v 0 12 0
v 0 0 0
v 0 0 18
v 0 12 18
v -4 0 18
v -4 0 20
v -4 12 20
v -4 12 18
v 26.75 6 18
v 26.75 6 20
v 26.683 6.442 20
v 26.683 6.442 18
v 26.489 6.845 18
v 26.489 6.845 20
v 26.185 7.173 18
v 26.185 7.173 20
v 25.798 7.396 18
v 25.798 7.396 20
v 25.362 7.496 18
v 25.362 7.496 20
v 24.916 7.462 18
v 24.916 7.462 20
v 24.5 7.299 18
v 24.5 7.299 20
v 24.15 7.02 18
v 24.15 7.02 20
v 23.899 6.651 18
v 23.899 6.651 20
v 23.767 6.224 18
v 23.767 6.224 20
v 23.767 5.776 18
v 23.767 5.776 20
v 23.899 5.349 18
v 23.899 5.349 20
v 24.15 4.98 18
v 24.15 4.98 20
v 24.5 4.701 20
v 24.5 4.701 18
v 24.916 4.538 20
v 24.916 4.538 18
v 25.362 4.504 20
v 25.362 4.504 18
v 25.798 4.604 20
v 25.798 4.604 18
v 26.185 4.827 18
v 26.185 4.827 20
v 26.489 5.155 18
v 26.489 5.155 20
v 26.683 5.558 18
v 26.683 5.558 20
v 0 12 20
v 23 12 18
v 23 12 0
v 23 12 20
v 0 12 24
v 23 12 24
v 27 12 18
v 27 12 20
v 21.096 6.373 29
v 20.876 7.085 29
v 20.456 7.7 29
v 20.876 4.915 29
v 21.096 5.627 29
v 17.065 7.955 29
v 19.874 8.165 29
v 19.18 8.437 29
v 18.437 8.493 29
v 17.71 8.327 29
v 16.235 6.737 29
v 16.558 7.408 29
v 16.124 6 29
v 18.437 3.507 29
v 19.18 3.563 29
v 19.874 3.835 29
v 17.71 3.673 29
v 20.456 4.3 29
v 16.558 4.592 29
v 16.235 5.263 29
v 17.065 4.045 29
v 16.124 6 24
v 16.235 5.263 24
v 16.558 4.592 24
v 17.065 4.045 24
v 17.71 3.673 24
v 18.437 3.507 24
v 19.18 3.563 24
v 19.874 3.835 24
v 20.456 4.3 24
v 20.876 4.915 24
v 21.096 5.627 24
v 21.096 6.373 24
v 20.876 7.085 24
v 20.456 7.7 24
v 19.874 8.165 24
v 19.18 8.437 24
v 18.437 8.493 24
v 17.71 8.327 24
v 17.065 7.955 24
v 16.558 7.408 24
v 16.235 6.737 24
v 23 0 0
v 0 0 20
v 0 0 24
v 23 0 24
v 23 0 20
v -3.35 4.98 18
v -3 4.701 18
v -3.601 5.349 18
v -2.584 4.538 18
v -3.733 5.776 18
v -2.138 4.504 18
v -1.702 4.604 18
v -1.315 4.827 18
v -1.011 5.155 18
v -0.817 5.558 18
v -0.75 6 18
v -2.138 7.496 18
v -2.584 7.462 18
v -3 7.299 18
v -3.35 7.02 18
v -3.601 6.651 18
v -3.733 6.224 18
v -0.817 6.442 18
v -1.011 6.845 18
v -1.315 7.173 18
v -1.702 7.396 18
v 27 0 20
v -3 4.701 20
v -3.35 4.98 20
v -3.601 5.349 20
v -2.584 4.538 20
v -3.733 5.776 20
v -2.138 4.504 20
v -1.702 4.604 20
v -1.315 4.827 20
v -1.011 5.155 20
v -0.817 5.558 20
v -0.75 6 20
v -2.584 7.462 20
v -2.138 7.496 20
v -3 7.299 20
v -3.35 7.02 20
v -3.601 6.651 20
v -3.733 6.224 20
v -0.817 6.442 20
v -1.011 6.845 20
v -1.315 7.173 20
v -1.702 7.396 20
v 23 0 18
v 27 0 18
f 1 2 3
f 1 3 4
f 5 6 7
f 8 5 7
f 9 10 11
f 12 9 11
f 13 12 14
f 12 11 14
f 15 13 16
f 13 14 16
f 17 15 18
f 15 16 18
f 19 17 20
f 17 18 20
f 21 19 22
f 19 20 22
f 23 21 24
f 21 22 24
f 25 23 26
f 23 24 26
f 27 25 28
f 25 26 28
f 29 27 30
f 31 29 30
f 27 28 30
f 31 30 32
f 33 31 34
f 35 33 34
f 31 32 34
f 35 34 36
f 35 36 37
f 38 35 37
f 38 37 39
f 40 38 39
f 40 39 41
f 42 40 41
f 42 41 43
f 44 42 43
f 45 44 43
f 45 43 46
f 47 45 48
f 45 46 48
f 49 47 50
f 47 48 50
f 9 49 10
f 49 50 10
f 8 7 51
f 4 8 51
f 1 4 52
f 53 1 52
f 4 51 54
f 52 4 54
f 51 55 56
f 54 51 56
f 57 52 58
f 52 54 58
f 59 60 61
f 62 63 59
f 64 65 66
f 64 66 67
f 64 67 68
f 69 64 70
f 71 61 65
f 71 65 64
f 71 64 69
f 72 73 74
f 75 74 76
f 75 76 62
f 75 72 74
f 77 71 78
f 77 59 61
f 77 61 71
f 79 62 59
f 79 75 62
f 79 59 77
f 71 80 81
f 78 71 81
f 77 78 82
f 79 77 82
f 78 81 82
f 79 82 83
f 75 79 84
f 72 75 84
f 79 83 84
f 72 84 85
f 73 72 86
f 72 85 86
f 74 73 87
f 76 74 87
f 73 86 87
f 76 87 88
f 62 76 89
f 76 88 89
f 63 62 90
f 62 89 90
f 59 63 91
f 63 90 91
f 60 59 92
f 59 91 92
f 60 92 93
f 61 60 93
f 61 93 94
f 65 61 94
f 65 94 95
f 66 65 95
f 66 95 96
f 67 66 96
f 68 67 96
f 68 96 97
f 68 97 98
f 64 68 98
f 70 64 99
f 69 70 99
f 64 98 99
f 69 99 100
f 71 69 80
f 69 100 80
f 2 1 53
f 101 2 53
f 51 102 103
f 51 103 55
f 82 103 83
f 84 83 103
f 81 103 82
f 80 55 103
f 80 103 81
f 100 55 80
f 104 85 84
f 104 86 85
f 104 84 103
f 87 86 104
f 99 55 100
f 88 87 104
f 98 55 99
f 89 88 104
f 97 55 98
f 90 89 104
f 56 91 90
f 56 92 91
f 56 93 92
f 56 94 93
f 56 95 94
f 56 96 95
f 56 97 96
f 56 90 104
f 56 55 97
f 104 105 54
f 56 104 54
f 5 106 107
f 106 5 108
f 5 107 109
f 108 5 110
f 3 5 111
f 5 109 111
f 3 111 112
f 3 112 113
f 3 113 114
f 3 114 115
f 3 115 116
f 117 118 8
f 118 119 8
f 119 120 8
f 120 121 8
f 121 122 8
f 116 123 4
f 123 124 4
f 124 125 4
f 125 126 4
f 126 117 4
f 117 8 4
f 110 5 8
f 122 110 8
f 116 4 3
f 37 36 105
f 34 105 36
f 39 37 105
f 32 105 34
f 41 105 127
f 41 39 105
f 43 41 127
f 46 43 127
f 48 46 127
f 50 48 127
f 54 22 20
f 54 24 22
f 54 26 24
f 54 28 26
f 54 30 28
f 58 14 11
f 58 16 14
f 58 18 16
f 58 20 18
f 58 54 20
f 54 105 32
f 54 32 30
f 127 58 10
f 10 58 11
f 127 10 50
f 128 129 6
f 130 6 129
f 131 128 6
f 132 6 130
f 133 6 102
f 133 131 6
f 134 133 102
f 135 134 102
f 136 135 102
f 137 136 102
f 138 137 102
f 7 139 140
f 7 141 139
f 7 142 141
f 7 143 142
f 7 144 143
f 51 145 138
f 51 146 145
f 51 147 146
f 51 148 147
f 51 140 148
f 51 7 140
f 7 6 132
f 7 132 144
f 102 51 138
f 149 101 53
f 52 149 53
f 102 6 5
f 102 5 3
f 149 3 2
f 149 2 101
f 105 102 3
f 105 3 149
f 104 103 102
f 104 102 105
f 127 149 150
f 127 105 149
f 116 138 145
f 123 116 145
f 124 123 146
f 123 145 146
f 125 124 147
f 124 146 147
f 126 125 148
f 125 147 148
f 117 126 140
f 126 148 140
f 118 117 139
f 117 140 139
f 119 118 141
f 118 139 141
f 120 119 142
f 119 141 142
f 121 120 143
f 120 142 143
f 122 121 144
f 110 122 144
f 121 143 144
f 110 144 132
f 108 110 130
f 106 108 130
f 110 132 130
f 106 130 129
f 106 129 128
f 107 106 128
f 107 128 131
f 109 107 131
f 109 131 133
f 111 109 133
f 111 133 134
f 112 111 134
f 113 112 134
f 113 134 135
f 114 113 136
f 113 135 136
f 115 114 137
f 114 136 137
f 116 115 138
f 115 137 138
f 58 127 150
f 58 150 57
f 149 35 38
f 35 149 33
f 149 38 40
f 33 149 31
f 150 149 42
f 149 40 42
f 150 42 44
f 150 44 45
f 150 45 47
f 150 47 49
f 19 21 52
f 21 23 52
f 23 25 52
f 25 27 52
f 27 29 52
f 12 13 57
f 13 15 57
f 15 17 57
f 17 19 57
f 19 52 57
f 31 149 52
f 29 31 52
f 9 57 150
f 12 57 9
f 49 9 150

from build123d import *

# Parameters (mm, degrees)
SKETCH_1_W      = 23
SKETCH_1_H      = 12
EXTRUDE_1_DEPTH = 20
SKETCH_2_W      = 4
SKETCH_2_H      = 12
SKETCH_2_R      = 1.5
EXTRUDE_2_DEPTH = 2
SKETCH_3_W      = 23
SKETCH_3_H      = 12
EXTRUDE_3_DEPTH = 4
SKETCH_4_R      = 2.5
EXTRUDE_4_DEPTH = 5


with BuildPart() as part:
    # 草图1 → 凸台-拉伸1 (new body)
    with BuildSketch(Plane.XY):
        with Locations((11.5, 6)):
            Rectangle(SKETCH_1_W, SKETCH_1_H)
    extrude(amount=EXTRUDE_1_DEPTH)

    # 草图2 → 凸台-拉伸2 (add)
    # profile 1 of 2: a face of its own
    with BuildSketch(Plane.XY.offset(20)):
        with Locations((-2, 6)):
            Rectangle(SKETCH_2_W, SKETCH_2_H)
        with Locations((-2.25, 6)):
            Circle(SKETCH_2_R, mode=Mode.SUBTRACT)
    # profile 2 of 2: a face of its own
    with BuildSketch(Plane.XY.offset(20)):
        with Locations((25, 6)):
            Rectangle(SKETCH_2_W, SKETCH_2_H)
        with Locations((25.25, 6)):
            Circle(SKETCH_2_R, mode=Mode.SUBTRACT)
    extrude(amount=-EXTRUDE_2_DEPTH)

    # 草图3 → 凸台-拉伸3 (add)
    with BuildSketch(Plane.XY.offset(20)):
        with Locations((11.5, 6)):
            Rectangle(SKETCH_3_W, SKETCH_3_H)
    extrude(amount=EXTRUDE_3_DEPTH)

    # 草图4 → 凸台-拉伸4 (add)
    with BuildSketch(Plane.XY.offset(24)):
        with Locations(Location((18.623805867, 6, 0), (0, 0, 180))):
            Circle(SKETCH_4_R)
    extrude(amount=EXTRUDE_4_DEPTH)


solid = part.part
